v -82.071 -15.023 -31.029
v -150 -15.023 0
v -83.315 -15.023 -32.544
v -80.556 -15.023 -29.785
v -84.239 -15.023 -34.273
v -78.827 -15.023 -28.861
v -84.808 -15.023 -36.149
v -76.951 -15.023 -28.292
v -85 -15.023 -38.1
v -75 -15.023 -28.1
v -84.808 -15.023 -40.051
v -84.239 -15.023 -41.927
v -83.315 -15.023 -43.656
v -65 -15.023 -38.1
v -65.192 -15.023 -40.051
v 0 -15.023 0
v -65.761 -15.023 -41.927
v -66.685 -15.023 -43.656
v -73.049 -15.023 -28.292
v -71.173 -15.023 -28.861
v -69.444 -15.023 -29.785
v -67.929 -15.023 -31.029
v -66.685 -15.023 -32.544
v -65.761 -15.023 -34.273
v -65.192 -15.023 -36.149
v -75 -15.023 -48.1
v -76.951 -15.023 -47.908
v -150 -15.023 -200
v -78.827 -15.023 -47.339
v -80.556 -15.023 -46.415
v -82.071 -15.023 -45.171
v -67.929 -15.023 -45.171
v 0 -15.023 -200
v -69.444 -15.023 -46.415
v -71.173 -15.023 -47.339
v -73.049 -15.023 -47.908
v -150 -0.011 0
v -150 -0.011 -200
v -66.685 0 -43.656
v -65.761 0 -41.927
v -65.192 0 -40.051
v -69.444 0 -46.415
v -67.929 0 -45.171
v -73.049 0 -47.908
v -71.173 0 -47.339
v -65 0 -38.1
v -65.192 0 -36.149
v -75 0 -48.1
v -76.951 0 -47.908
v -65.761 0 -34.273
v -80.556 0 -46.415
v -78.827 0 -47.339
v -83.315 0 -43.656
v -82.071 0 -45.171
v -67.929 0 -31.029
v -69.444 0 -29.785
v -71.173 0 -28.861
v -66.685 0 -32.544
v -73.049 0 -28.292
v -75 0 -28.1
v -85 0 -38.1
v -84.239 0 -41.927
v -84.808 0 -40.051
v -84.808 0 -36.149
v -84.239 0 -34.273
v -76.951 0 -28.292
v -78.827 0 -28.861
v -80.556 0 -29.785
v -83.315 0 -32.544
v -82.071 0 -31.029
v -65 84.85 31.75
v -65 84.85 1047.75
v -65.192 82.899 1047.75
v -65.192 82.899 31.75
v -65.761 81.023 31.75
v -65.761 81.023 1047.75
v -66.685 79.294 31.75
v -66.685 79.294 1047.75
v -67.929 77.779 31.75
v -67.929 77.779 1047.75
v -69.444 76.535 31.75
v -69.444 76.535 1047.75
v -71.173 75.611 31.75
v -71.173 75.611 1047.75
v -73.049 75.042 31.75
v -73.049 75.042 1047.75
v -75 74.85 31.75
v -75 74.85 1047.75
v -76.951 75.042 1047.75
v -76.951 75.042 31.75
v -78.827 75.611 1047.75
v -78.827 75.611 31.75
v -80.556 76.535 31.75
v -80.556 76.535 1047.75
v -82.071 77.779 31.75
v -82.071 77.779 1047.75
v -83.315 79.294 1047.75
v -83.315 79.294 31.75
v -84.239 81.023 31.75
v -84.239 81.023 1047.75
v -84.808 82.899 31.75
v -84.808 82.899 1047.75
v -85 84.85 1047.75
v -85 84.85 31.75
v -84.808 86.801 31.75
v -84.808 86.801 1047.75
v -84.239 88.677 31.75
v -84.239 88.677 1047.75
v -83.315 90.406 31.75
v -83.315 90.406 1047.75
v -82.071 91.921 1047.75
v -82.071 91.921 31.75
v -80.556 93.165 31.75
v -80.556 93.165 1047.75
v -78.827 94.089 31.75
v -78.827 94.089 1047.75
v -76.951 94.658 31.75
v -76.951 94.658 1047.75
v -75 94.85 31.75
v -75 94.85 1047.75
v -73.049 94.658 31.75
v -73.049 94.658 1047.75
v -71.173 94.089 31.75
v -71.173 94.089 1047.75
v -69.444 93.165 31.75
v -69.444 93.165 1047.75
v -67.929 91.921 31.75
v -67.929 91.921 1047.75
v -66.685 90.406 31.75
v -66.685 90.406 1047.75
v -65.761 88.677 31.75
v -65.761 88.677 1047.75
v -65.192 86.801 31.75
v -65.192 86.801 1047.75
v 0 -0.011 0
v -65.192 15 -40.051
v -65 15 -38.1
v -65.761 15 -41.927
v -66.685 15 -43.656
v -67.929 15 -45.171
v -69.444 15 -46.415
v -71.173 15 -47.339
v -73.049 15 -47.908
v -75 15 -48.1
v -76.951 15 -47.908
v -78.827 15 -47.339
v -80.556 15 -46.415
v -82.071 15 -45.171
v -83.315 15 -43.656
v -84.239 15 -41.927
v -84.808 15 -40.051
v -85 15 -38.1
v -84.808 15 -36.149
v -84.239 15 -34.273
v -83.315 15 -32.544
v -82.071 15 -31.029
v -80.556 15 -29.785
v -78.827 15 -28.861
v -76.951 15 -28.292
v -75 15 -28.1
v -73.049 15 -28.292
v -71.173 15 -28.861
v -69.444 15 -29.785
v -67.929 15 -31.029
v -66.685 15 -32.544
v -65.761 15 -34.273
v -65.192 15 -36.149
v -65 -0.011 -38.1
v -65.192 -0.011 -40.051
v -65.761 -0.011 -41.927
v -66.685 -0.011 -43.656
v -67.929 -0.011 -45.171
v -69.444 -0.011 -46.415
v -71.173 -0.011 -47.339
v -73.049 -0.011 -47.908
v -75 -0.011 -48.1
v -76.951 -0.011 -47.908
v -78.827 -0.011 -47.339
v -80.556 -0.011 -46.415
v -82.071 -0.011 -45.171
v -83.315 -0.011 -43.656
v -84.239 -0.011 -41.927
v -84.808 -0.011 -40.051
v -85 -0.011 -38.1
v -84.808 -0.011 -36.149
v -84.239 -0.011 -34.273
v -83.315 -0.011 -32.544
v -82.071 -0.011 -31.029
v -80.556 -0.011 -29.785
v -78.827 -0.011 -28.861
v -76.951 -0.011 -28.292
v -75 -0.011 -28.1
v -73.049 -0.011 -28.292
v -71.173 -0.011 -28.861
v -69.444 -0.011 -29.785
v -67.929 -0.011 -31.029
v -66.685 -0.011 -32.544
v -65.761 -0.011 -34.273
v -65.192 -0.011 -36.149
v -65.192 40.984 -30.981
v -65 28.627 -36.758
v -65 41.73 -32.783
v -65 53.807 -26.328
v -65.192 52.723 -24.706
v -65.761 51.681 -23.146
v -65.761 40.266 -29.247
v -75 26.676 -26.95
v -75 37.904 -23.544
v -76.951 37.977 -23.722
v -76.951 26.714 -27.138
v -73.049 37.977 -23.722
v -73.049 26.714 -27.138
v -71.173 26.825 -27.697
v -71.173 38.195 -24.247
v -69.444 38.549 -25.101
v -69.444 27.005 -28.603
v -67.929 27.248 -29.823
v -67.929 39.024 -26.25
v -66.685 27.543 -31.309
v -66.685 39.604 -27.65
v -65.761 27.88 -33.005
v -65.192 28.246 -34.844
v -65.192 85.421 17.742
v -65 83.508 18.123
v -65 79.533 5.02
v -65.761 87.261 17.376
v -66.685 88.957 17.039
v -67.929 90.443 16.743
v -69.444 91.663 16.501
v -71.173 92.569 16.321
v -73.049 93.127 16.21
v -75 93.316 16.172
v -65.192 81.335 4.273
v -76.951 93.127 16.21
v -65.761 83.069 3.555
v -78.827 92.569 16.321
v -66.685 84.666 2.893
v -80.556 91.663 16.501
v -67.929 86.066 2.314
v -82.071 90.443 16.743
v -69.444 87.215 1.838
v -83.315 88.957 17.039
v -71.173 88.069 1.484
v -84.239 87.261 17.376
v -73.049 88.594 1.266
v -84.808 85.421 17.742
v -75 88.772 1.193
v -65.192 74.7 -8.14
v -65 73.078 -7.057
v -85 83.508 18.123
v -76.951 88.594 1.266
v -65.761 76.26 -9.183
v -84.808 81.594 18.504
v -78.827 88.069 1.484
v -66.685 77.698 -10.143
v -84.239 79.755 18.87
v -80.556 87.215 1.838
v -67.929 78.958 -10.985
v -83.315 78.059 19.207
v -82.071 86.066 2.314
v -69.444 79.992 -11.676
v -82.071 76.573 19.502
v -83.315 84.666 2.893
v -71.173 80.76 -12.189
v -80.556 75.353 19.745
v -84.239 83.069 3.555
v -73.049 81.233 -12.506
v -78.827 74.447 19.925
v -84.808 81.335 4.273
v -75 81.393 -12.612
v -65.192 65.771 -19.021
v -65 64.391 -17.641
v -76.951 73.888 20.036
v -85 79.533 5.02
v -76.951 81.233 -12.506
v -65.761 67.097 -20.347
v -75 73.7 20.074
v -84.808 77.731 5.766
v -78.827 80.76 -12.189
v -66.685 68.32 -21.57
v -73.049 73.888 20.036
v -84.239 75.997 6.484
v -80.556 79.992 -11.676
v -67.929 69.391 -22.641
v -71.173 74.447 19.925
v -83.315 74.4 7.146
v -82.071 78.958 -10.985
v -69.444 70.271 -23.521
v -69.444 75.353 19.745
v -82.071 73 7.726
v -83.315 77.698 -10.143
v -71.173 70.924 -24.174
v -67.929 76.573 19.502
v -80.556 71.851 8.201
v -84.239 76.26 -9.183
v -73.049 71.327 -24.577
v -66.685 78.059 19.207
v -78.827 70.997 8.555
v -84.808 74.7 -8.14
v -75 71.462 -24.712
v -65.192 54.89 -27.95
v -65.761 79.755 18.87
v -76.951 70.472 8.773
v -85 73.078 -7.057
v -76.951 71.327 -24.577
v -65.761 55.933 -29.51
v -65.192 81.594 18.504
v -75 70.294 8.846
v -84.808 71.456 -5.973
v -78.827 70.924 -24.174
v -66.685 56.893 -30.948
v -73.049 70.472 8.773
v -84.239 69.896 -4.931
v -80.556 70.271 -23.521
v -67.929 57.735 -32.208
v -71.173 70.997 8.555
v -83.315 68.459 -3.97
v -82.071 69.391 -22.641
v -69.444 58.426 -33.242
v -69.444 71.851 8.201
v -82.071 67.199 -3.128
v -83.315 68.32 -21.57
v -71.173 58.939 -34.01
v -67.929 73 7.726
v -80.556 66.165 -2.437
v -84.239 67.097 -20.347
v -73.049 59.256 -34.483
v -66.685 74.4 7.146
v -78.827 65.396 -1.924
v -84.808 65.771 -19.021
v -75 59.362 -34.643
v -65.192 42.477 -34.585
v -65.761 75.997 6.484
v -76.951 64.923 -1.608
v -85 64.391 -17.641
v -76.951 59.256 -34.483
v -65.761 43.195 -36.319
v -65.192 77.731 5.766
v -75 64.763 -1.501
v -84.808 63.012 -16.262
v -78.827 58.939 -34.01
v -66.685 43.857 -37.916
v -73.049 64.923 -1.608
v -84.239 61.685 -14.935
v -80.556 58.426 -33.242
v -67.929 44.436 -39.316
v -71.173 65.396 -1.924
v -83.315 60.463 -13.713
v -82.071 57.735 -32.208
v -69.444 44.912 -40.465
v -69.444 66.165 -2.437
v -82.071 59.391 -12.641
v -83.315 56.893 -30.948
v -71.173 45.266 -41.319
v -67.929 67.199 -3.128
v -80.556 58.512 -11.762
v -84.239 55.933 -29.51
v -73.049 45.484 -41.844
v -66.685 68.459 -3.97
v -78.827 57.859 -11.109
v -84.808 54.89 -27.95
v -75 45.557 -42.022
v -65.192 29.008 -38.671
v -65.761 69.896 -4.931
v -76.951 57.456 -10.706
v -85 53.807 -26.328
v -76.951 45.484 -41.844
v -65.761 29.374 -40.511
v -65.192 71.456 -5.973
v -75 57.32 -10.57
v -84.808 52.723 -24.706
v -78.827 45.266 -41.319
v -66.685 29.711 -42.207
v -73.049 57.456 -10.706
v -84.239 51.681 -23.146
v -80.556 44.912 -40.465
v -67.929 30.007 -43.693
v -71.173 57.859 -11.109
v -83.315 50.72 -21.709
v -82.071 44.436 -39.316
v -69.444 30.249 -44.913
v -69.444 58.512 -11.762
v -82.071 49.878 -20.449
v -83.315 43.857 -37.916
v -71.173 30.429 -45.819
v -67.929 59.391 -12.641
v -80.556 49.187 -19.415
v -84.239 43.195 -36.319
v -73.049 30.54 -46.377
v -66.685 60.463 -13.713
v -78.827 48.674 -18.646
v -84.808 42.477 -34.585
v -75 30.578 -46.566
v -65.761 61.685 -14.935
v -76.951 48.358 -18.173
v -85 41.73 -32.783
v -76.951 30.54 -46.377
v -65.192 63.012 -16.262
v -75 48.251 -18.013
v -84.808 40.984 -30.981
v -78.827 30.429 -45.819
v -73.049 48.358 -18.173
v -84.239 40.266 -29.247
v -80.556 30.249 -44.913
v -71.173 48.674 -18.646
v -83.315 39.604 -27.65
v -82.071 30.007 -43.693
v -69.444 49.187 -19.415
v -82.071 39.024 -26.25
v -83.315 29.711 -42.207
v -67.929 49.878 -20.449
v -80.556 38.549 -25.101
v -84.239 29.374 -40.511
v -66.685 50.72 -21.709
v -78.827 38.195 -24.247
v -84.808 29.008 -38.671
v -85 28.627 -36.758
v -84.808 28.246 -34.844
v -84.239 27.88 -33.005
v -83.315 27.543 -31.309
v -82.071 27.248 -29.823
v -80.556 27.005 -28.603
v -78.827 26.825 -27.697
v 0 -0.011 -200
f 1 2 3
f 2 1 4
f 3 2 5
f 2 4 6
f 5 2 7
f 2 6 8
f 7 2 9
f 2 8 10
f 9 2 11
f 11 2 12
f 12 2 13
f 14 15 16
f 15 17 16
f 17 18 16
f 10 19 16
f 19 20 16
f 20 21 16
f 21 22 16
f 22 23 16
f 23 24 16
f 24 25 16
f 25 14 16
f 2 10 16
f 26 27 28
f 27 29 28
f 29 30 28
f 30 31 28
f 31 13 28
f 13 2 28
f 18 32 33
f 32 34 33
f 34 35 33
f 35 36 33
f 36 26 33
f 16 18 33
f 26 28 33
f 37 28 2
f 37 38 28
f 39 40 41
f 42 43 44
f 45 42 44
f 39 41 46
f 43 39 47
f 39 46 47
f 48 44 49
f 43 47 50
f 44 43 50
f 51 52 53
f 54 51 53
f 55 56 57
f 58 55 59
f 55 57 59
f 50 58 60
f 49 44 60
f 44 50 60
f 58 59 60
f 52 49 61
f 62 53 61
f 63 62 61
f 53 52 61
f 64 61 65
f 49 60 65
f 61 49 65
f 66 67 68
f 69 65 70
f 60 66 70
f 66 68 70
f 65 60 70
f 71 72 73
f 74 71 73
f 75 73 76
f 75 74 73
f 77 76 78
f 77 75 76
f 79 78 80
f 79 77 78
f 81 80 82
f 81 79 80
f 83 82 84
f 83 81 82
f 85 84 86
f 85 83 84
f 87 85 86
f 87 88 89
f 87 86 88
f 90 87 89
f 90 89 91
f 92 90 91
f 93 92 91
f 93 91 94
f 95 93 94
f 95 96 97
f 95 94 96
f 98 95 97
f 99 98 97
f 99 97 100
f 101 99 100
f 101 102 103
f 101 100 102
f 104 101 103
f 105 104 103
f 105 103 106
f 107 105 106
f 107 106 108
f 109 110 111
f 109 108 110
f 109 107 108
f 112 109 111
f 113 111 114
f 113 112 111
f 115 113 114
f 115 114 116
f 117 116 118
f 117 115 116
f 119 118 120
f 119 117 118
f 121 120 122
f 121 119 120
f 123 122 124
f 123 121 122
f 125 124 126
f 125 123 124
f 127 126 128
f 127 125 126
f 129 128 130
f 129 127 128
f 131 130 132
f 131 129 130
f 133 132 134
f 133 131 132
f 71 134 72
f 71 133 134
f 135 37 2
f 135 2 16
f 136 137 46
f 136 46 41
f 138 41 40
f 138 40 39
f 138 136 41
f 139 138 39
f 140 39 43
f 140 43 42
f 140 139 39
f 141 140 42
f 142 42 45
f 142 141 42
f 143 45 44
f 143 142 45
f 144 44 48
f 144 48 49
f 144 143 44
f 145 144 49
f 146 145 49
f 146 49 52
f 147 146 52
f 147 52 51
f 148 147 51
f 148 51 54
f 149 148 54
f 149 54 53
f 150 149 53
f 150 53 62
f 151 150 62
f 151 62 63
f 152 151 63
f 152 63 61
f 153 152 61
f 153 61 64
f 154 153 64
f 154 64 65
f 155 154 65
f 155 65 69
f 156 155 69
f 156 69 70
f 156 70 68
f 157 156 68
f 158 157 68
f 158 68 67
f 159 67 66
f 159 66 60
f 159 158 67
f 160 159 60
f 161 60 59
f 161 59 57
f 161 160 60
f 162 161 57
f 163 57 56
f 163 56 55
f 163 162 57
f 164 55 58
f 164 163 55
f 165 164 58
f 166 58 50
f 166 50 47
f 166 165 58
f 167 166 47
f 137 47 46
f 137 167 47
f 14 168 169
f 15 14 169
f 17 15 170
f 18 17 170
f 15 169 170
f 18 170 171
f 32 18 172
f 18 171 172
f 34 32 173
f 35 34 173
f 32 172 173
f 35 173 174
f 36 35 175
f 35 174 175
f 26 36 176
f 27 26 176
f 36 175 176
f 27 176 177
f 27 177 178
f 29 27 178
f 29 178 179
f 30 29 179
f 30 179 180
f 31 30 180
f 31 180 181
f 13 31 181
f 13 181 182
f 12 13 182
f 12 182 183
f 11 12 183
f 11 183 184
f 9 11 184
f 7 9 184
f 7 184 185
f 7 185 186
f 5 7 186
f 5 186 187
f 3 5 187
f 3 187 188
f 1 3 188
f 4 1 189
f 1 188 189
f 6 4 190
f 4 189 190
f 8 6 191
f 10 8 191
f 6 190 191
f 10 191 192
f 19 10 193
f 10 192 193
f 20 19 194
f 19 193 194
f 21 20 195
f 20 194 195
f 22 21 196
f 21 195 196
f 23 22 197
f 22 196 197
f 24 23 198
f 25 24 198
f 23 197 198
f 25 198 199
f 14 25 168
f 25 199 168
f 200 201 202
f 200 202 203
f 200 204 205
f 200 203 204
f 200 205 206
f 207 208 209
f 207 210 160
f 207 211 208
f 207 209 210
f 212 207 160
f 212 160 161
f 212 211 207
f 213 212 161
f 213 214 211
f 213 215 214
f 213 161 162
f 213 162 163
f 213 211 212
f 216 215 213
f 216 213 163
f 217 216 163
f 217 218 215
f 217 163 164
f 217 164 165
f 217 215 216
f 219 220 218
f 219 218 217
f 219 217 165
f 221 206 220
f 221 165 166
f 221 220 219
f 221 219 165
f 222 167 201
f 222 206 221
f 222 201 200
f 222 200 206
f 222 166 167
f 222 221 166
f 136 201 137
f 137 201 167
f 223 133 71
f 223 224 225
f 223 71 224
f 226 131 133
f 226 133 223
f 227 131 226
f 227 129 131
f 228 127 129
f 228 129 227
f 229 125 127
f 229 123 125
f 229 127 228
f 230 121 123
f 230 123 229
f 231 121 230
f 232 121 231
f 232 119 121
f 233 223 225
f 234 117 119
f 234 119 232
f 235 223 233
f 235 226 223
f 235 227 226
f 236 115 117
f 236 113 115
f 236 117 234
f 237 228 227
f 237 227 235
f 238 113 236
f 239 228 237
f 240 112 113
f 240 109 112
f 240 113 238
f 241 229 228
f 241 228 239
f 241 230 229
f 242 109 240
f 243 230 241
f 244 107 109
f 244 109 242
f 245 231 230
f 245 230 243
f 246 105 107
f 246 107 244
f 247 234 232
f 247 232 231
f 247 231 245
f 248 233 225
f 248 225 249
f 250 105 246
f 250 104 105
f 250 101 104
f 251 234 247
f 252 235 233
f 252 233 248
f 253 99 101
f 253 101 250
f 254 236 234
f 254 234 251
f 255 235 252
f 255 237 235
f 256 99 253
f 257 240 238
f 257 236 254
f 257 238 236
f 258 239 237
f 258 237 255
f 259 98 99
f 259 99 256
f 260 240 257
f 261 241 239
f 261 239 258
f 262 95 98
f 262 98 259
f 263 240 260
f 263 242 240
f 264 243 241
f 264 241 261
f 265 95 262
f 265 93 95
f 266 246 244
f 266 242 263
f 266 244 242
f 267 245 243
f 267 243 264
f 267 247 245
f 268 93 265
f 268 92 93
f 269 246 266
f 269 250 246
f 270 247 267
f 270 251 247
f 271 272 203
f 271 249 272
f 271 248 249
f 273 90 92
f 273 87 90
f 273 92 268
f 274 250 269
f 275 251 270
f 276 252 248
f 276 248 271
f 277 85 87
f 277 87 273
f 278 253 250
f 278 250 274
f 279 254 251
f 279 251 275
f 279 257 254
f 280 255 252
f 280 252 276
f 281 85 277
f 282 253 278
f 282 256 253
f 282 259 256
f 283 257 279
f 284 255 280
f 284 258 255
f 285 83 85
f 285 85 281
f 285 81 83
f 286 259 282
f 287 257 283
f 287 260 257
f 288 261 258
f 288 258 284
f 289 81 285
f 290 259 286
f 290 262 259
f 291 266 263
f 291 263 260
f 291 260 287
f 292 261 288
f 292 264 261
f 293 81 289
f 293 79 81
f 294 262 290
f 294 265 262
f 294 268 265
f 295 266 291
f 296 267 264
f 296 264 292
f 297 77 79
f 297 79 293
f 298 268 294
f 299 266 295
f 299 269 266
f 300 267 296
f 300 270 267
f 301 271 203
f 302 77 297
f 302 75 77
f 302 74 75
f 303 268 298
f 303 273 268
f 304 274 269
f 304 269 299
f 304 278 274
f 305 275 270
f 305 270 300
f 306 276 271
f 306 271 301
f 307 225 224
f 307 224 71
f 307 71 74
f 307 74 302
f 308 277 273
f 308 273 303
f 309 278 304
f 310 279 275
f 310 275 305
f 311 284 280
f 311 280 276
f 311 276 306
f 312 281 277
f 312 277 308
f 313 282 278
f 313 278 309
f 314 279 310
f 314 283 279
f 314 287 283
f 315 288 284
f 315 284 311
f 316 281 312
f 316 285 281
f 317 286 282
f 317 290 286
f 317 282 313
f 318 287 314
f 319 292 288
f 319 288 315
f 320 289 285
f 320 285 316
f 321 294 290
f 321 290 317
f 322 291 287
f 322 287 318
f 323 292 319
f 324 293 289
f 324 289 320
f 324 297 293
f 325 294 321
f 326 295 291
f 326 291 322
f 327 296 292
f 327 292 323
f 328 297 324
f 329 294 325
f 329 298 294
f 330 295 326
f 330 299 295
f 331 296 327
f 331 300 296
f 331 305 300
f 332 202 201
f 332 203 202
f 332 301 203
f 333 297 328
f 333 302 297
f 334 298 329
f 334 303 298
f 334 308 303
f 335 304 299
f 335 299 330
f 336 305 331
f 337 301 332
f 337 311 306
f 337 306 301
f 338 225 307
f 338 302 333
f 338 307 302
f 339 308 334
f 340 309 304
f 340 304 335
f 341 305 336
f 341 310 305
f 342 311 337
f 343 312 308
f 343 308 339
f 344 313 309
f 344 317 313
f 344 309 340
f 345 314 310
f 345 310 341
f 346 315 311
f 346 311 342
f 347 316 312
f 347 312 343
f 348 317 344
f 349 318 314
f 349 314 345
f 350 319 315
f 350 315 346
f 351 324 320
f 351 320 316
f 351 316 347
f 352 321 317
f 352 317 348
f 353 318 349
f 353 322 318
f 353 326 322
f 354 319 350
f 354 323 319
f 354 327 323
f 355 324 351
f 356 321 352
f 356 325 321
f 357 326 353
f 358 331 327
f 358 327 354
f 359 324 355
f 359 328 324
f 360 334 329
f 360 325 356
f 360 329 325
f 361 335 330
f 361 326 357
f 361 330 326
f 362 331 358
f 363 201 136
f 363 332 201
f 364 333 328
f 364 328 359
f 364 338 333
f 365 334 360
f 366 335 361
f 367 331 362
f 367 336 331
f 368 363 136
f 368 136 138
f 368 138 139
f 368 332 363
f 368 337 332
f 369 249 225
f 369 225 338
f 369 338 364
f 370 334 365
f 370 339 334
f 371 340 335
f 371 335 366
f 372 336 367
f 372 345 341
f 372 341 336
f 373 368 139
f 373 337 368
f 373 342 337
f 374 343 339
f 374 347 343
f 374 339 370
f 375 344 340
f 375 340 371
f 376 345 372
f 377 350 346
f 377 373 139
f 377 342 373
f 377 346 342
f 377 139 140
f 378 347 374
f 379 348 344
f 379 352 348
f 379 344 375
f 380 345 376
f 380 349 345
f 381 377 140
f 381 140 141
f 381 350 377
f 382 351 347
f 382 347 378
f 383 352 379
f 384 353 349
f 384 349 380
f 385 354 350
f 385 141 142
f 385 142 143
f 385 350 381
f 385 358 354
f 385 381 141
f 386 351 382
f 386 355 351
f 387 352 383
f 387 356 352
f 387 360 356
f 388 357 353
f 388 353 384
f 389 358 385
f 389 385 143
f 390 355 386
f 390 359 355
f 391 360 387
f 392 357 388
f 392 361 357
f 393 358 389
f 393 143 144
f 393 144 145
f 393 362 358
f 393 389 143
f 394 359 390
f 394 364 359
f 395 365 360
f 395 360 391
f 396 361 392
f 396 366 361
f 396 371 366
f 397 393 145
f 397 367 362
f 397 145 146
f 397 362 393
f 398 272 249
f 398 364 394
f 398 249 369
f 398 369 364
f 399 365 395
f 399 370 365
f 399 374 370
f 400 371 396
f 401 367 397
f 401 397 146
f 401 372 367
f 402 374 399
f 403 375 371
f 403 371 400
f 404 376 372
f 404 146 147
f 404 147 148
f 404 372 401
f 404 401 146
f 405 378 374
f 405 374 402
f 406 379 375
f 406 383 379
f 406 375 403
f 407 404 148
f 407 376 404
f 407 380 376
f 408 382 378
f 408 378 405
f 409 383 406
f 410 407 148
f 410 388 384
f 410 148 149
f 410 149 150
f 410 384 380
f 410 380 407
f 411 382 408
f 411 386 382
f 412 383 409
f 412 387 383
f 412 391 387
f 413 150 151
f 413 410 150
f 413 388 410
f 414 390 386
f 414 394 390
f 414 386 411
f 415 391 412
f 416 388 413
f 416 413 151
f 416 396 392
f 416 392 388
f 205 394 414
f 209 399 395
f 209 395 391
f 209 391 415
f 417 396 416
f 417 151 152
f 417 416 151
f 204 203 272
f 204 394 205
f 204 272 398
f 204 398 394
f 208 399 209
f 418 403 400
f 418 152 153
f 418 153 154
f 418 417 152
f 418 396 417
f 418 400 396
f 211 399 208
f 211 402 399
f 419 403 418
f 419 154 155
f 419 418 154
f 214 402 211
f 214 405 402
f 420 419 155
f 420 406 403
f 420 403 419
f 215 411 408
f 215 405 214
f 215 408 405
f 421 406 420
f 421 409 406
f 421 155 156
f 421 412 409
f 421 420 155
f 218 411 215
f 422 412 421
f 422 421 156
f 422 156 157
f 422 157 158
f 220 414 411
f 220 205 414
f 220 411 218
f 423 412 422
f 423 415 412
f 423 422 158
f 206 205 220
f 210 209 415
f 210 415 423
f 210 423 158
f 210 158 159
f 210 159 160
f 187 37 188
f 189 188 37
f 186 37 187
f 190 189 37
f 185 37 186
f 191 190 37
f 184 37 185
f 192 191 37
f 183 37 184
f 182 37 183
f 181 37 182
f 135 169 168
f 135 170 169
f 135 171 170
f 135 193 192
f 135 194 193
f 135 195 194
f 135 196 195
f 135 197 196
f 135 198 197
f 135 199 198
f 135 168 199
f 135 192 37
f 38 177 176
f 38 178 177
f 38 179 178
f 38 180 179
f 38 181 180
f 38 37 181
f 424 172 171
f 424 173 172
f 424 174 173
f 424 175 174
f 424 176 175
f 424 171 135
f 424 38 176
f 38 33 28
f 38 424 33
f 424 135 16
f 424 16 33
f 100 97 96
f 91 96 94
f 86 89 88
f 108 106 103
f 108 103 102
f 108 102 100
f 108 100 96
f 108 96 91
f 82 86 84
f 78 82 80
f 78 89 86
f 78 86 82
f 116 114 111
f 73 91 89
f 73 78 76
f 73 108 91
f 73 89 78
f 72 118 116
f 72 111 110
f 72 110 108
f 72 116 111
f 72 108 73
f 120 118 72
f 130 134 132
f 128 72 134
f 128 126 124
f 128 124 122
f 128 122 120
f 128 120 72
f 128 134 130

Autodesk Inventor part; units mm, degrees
ref_plane "YZ Plane" through (0, 0, 0) normal (1, 0, 0) x (0, 1, 0)
sketch "Sketch1" plane through (0, 0, 0) normal (0, 1, 0) x (-1, 0, 0)
  line L0 (0, 0) -> (150, 0)
  line L1 (150, 0) -> (150, -200)
  line L2 (150, -200) -> (0, -200)
  line L3 (0, -200) -> (0, 0)
  dimension "d0" = 150
  dimension "d1" = 200
extrude "Extrusion1" add sketch "Sketch1" along normal blind 15
sketch "Sketch2" plane through (0, 15, 0) normal (0, 1, 0) x (1, 0, 0)
  circle A0 centre (-75, 38.1) radius 10
  line L0 (-150, 0) -> (0, 0) projected
  line L1 (0, 0) -> (-150, 0)
  line L2 (-181.75, -31.75) -> (31.75, -31.75)
  dimension "d5" = 20
  dimension "d15" = 31.75
ref_plane "Work Plane2" through (0, 15, 0) normal (0, 0, 1) x (1, 0, 0)
ref_plane "Work Plane3" through (-150, 0, 50.8) normal (0, 0, 1) x (1, 0, 0)
ref_plane "Work Plane5" through (0, 15, 31.75) normal (0, 0, 1) x (1, 0, 0)
revolve "Revolution2" add sketch "Sketch2" angle 90 about axis through (-181.75, 15, 31.75) along (1, 0, 0)
sketch "Sketch7" plane through (-75, 84.85, 31.75) normal (0, 0, 1) x (1, 0, 0)
  circle A0 centre (0, 0) radius 10 projected
  point P0 (75, -84.85)
extrude "Extrusion3" add sketch "Sketch7" along normal blind 1016
sketch "Sketch8" plane through (0, 15, 0) normal (0, 1, 0) x (1, 0, 0)
  circle A0 centre (-75, 38.1) radius 10 projected
  line L0 (-150, 0) -> (0, 0) projected
  line L1 (0, 0) -> (0, 200) projected
  line L2 (0, 200) -> (-150, 200) projected
  line L3 (-150, 200) -> (-150, 0) projected
extrude "Extrusion4" add sketch "Sketch8" against normal blind 30.0228
sketch "Sketch9" plane through (0, 15, 0) normal (0, 1, 0) x (1, 0, 0)
  circle A0 centre (-75, 38.1) radius 10 projected
  line L0 (-150, 0) -> (0, 0) projected
  line L1 (0, 0) -> (0, 200) projected
  line L2 (0, 200) -> (-150, 200) projected
  line L3 (-150, 200) -> (-150, 0) projected
extrude "Extrusion5" cut sketch "Sketch9" against normal blind 15.0114
properties part number "vent cover"
